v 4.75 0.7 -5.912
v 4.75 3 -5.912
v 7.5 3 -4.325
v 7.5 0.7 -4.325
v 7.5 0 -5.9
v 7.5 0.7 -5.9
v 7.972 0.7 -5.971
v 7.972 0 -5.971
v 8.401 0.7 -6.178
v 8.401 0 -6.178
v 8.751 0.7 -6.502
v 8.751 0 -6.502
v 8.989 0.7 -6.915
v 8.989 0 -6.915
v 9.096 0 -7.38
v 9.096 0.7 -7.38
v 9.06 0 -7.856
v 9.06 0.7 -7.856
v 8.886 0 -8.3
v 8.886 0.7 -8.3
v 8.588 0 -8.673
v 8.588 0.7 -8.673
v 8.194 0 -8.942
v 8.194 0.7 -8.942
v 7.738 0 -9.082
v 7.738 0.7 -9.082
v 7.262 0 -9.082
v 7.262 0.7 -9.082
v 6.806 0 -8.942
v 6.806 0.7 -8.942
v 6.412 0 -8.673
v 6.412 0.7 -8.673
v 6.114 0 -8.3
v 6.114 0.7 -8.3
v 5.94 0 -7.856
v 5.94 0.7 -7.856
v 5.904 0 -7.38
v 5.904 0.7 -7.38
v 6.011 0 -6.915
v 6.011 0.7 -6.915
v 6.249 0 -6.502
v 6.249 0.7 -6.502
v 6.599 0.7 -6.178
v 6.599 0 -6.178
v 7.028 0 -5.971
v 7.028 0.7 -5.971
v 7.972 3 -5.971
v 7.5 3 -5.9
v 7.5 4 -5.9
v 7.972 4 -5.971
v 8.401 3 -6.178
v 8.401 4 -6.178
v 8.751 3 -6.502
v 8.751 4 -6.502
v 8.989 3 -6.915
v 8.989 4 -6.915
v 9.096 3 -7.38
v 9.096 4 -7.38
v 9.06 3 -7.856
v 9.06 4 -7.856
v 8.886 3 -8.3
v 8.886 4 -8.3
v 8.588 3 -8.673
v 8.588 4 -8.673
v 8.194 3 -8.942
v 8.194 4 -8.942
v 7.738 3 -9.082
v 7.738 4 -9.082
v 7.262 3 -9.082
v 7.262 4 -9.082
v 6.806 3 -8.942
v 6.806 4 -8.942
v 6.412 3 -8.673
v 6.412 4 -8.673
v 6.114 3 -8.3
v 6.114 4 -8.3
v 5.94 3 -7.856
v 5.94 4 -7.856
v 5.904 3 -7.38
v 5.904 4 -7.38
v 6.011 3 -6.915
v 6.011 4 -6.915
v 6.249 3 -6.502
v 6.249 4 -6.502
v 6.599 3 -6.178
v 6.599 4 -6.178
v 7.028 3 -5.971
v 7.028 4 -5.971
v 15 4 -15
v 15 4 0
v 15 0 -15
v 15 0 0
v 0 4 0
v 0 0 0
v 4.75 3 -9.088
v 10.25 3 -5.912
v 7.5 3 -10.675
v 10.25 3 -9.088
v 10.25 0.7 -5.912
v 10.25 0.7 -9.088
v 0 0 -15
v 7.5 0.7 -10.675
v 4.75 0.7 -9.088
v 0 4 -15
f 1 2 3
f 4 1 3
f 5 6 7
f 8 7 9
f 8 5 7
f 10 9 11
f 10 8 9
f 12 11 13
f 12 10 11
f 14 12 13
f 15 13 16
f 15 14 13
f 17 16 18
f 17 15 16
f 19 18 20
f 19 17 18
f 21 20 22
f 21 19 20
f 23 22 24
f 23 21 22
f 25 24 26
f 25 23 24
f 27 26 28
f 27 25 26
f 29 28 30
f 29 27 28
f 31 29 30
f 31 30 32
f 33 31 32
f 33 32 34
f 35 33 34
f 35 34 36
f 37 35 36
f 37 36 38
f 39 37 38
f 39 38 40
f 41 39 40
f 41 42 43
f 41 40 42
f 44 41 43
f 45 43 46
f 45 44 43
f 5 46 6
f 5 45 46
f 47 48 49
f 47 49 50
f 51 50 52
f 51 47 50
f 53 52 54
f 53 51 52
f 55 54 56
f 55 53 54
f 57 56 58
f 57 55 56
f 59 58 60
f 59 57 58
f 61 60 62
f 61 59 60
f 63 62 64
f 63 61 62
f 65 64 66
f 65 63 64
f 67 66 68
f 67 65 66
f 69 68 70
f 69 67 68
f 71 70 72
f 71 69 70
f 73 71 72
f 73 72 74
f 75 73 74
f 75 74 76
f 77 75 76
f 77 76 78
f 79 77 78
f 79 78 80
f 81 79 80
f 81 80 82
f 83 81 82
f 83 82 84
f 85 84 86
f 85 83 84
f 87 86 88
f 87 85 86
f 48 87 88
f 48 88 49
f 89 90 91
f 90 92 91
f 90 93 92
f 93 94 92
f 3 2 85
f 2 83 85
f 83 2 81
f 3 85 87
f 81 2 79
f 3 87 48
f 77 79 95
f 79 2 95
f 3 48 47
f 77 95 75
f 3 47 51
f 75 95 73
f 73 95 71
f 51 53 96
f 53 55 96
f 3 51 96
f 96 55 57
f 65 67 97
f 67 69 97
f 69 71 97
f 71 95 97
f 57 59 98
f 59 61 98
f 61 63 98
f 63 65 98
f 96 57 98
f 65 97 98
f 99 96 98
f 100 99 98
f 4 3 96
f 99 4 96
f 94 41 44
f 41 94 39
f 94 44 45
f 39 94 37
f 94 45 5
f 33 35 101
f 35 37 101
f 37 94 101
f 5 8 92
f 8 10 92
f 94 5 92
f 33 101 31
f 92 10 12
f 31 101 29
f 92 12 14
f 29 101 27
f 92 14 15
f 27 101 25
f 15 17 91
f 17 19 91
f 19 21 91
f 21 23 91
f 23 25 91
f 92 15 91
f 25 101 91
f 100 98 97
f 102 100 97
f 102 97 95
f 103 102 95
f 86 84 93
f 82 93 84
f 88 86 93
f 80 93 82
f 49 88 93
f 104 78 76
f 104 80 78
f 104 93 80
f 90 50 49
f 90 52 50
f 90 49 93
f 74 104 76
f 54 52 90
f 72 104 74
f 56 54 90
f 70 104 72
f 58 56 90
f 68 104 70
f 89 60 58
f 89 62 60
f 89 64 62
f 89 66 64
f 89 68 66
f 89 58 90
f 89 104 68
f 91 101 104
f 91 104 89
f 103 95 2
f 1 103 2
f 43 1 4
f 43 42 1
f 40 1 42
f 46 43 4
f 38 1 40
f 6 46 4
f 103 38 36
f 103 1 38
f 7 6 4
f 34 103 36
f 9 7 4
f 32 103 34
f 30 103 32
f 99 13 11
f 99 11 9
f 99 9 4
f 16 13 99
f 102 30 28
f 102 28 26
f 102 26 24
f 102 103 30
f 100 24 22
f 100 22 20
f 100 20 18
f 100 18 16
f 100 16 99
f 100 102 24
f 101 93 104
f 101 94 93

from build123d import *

# Parameters (mm, degrees)
CROQUIS1_W              = 15
CROQUIS1_H              = 15
CROQUIS1_R              = 1.6
SALIENTE_EXTRUIR1_DEPTH = 3
CORTAR_EXTRUIR1_DEPTH   = 2.3
CROQUIS3_W              = 15
CROQUIS3_H              = 15
CROQUIS3_R              = 1.6
SALIENTE_EXTRUIR2_DEPTH = 1


with BuildPart() as part:
    # Croquis1 → Saliente-Extruir1 (new body)
    with BuildSketch(Plane(origin=(0, 0, 0), x_dir=(1, 0, 0), z_dir=(0, 1, 0))):
        with Locations((7.5, 7.5)):
            Rectangle(CROQUIS1_W, CROQUIS1_H)
        with Locations(Location((7.5, 7.5, 0), (0, 0, 270))):
            Circle(CROQUIS1_R, mode=Mode.SUBTRACT)
    extrude(amount=SALIENTE_EXTRUIR1_DEPTH)

    # Croquis2 → Cortar-Extruir1 (cut)
    with BuildSketch(Plane(origin=(0, 3, 0), x_dir=(1, 0, 0), z_dir=(0, 1, 0))):
        Polygon((7.5, 4.324573519), (10.25, 5.91228676), (10.25, 9.08771324), (7.5, 10.675426481), (4.75, 9.08771324), (4.75, 5.91228676), align=None)
    extrude(amount=-CORTAR_EXTRUIR1_DEPTH, mode=Mode.SUBTRACT)

    # Croquis3 → Saliente-Extruir2 (add)
    with BuildSketch(Plane(origin=(0, 3, 0), x_dir=(1, 0, 0), z_dir=(0, 1, 0))):
        with Locations((7.5, 7.5)):
            Rectangle(CROQUIS3_W, CROQUIS3_H)
        with Locations(Location((7.5, 7.5, 0), (0, 0, 270))):
            Circle(CROQUIS3_R, mode=Mode.SUBTRACT)
    extrude(amount=SALIENTE_EXTRUIR2_DEPTH)


solid = part.part
